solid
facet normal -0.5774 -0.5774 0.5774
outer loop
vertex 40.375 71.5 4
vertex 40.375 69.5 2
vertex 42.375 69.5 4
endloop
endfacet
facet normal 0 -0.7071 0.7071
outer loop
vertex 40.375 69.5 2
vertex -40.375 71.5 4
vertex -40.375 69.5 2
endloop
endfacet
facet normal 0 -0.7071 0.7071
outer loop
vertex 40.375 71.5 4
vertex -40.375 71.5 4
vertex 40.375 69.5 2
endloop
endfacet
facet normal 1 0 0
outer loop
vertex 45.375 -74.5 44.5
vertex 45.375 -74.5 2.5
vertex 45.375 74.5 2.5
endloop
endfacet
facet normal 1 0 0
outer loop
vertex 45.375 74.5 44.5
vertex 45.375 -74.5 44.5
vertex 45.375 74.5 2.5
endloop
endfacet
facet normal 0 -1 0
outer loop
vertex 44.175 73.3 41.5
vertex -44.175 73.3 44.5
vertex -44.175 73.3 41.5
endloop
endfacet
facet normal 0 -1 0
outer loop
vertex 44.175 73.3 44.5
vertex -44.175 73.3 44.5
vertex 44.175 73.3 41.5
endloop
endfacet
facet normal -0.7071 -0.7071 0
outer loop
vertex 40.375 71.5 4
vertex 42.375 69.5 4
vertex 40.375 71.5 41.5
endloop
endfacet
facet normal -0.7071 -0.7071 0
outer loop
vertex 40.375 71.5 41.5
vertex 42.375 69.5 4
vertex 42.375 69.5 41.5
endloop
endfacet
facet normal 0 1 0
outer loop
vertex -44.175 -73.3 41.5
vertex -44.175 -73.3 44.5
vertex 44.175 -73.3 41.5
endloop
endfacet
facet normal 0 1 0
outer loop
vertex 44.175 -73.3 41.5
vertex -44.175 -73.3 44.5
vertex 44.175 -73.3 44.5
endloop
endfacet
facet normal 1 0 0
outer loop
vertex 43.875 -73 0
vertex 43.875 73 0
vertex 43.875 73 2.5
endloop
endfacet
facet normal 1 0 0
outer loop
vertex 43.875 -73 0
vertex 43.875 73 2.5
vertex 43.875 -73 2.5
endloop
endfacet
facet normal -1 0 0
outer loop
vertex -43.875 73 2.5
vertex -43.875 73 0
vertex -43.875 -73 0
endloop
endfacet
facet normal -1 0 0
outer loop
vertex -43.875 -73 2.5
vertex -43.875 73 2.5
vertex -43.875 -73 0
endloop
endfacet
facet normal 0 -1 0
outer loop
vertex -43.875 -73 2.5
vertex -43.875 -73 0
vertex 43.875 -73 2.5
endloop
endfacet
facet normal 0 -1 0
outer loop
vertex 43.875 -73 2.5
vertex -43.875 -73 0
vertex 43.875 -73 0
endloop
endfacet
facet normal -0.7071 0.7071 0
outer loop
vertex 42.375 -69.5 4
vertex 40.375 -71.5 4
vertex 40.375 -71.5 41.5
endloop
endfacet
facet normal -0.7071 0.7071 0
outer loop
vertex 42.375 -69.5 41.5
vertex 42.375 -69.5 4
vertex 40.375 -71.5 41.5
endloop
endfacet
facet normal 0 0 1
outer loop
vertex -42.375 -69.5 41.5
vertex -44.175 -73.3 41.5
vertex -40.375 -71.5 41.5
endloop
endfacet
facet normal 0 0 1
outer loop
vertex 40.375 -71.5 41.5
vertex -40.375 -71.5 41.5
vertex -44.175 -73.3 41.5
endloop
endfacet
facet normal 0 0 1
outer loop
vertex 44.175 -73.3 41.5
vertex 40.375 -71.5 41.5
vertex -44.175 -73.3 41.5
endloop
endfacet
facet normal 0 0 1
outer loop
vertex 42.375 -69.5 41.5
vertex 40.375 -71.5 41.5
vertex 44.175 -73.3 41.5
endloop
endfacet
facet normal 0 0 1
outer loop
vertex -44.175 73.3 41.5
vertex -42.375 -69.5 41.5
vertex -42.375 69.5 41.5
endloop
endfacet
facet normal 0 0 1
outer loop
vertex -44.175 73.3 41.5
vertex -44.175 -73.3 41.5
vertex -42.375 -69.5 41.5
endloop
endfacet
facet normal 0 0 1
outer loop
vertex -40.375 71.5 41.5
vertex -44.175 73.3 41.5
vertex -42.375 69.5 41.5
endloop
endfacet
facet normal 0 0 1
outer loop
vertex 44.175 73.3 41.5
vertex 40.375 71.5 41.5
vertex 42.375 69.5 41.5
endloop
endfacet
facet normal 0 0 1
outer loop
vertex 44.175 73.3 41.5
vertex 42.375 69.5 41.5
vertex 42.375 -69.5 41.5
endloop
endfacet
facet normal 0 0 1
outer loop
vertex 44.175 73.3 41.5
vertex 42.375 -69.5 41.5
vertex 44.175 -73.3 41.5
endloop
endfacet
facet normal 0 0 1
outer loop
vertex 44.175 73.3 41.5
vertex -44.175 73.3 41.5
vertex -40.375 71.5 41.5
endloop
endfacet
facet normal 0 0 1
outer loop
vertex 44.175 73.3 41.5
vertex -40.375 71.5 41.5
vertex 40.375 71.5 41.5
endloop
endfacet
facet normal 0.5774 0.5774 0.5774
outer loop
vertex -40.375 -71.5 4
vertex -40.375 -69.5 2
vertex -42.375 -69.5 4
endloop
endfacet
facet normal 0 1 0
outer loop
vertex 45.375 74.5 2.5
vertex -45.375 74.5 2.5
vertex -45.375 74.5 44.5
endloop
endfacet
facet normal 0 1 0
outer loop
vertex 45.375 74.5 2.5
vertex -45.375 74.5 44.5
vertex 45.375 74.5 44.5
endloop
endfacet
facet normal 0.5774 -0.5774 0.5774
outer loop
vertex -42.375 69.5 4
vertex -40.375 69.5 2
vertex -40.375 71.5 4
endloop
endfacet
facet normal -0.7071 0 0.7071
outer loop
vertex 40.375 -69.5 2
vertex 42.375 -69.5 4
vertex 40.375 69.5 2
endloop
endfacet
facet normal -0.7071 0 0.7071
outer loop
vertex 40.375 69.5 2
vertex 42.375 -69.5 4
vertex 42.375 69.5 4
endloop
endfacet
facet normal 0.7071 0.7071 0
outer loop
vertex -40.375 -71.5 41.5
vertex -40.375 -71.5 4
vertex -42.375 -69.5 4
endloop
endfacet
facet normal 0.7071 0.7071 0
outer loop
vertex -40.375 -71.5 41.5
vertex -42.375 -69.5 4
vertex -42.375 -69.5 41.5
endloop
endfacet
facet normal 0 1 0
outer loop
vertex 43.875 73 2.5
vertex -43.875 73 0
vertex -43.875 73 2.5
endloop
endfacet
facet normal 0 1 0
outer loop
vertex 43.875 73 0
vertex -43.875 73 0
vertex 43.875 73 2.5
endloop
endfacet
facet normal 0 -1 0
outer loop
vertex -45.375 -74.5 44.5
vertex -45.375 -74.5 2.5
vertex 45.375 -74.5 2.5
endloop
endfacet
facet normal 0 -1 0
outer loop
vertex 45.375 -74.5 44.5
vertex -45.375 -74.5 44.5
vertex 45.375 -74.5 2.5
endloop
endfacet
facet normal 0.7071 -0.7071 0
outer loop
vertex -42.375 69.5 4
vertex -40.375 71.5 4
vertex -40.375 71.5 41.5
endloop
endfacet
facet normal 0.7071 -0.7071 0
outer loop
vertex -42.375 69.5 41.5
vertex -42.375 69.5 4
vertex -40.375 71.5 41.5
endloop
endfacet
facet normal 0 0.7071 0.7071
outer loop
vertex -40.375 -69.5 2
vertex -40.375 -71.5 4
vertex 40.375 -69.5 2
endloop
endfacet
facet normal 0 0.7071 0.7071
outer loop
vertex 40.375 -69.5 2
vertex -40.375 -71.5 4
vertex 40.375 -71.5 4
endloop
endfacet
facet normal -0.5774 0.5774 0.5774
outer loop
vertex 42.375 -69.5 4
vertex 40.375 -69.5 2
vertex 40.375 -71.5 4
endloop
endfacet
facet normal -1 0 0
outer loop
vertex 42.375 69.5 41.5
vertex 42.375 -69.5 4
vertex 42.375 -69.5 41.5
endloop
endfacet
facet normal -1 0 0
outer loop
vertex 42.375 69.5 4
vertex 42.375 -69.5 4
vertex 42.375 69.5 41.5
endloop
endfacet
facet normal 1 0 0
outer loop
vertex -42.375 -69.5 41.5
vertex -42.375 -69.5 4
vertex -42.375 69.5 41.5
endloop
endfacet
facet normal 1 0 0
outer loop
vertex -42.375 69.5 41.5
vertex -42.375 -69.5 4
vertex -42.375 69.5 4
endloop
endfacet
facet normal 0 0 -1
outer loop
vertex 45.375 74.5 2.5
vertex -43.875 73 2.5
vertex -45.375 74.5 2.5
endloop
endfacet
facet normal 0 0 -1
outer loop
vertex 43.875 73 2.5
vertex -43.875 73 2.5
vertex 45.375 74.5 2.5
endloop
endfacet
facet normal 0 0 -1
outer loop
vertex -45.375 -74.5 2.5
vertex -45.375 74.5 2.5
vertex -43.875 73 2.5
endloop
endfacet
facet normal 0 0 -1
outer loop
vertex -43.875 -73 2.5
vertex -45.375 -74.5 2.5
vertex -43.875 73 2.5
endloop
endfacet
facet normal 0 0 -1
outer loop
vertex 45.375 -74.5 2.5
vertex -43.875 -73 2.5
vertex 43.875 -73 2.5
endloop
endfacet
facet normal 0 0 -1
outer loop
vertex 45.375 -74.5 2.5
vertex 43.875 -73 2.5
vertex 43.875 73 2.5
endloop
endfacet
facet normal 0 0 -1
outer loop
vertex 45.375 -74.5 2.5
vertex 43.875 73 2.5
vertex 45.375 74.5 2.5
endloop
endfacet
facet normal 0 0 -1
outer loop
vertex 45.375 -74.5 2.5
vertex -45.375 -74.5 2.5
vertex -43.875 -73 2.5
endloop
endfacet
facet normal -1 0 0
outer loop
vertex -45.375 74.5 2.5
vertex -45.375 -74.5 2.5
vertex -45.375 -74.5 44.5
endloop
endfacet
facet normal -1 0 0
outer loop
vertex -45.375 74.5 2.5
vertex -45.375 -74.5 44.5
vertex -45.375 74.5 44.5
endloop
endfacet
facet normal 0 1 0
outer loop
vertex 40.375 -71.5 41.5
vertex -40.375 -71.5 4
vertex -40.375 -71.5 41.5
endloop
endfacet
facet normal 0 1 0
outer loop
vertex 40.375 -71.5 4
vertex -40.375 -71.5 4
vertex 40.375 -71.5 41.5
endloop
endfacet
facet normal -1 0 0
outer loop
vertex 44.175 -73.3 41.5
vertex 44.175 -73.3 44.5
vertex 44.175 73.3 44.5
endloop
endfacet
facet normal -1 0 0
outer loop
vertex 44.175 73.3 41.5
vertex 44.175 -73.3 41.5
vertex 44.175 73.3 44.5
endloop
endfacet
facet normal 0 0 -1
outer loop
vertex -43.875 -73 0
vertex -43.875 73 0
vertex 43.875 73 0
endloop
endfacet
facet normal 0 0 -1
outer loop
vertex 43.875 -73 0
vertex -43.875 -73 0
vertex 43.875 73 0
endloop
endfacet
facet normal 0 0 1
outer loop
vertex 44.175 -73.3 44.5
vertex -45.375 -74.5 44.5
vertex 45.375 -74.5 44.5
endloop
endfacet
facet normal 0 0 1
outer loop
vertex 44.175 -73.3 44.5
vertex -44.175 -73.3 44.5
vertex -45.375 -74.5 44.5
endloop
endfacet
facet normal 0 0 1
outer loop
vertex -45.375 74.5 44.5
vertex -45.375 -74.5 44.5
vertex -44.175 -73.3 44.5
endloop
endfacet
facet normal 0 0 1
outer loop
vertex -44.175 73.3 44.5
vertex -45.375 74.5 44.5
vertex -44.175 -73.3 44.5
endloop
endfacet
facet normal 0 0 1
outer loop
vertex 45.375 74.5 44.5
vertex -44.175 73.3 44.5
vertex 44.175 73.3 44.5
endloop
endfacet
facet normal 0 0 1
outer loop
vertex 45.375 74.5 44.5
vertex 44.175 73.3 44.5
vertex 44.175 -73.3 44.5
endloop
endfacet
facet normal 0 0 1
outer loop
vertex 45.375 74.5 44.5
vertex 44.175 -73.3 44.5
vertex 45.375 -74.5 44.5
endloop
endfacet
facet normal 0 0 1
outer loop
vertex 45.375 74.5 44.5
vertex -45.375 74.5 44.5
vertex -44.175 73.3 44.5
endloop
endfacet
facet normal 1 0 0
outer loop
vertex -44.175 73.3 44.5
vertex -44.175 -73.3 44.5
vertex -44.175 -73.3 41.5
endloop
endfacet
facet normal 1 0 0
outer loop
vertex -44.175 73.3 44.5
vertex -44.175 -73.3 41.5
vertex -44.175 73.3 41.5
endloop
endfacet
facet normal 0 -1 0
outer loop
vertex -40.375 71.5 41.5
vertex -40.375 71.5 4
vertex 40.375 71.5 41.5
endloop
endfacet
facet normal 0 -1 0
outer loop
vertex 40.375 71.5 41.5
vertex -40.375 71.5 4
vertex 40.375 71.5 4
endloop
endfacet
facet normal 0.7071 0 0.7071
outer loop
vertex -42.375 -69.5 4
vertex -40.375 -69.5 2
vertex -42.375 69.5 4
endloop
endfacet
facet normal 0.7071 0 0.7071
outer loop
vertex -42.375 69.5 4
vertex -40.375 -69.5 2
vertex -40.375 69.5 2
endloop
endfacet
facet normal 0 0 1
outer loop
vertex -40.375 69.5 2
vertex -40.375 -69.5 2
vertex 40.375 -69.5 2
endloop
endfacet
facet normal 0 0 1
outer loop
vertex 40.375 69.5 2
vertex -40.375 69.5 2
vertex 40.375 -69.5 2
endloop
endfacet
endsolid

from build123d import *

# Parameters (mm, degrees)
F1_W     = 90.75
F1_H     = 149
F1_W_2   = 84.75
F1_H_2   = 143
F2_DEPTH = 44.5
F3_DEPTH = 2
F4_SIZE  = 2
F5_W     = 88.35
F5_H     = 146.6
F6_DEPTH = 3
F7_W     = 90.75
F7_H     = 149
F7_W_2   = 87.75
F7_H_2   = 146
F8_DEPTH = 2.5


with BuildPart() as f2:
    # F1 (on Top) → F2 (new body)
    with BuildSketch(Plane.XY):
        Rectangle(F1_W, F1_H)
        Rectangle(F1_W_2, F1_H_2, mode=Mode.SUBTRACT)
    extrude(amount=F2_DEPTH)

    # F1 (on Top) → F3 (join)
    with BuildSketch(Plane.XY):
        Rectangle(F1_W, F1_H)
        Rectangle(F1_W_2, F1_H_2, mode=Mode.SUBTRACT)
        Rectangle(F1_W_2, F1_H_2)
    extrude(amount=F3_DEPTH)

    # F4
    f4_edges = [f2.edges().sort_by_distance(p)[0] for p in [
        (0, 71.5, 2),
        (42.375, 0, 2),
        (-42.375, 0, 2),
        (0, -71.5, 2),
        (42.375, -71.5, 23.25),
        (42.375, 71.5, 23.25),
        (-42.375, 71.5, 23.25),
        (-42.375, -71.5, 23.25),
    ]]
    chamfer(f4_edges, length=F4_SIZE)

    # F5 (on face) → F6 (cut)
    with BuildSketch(Plane.XY.offset(44.5)):
        Rectangle(F5_W, F5_H)
        Polygon((-40.375, -71.5), (-42.375, -69.5), (-42.375, 69.5), (-40.375, 71.5), (40.375, 71.5), (42.375, 69.5), (42.375, -69.5), (40.375, -71.5), align=None, mode=Mode.SUBTRACT)
    extrude(amount=-F6_DEPTH, mode=Mode.SUBTRACT)

    # F7 (on face) → F8 (cut)
    with BuildSketch(Plane(origin=(0, 0, 0), x_dir=(1, 0, 0), z_dir=(0, 0, -1))):
        Rectangle(F7_W, F7_H)
        Rectangle(F7_W_2, F7_H_2, mode=Mode.SUBTRACT)
    extrude(amount=-F8_DEPTH, mode=Mode.SUBTRACT)


solid = f2.part
